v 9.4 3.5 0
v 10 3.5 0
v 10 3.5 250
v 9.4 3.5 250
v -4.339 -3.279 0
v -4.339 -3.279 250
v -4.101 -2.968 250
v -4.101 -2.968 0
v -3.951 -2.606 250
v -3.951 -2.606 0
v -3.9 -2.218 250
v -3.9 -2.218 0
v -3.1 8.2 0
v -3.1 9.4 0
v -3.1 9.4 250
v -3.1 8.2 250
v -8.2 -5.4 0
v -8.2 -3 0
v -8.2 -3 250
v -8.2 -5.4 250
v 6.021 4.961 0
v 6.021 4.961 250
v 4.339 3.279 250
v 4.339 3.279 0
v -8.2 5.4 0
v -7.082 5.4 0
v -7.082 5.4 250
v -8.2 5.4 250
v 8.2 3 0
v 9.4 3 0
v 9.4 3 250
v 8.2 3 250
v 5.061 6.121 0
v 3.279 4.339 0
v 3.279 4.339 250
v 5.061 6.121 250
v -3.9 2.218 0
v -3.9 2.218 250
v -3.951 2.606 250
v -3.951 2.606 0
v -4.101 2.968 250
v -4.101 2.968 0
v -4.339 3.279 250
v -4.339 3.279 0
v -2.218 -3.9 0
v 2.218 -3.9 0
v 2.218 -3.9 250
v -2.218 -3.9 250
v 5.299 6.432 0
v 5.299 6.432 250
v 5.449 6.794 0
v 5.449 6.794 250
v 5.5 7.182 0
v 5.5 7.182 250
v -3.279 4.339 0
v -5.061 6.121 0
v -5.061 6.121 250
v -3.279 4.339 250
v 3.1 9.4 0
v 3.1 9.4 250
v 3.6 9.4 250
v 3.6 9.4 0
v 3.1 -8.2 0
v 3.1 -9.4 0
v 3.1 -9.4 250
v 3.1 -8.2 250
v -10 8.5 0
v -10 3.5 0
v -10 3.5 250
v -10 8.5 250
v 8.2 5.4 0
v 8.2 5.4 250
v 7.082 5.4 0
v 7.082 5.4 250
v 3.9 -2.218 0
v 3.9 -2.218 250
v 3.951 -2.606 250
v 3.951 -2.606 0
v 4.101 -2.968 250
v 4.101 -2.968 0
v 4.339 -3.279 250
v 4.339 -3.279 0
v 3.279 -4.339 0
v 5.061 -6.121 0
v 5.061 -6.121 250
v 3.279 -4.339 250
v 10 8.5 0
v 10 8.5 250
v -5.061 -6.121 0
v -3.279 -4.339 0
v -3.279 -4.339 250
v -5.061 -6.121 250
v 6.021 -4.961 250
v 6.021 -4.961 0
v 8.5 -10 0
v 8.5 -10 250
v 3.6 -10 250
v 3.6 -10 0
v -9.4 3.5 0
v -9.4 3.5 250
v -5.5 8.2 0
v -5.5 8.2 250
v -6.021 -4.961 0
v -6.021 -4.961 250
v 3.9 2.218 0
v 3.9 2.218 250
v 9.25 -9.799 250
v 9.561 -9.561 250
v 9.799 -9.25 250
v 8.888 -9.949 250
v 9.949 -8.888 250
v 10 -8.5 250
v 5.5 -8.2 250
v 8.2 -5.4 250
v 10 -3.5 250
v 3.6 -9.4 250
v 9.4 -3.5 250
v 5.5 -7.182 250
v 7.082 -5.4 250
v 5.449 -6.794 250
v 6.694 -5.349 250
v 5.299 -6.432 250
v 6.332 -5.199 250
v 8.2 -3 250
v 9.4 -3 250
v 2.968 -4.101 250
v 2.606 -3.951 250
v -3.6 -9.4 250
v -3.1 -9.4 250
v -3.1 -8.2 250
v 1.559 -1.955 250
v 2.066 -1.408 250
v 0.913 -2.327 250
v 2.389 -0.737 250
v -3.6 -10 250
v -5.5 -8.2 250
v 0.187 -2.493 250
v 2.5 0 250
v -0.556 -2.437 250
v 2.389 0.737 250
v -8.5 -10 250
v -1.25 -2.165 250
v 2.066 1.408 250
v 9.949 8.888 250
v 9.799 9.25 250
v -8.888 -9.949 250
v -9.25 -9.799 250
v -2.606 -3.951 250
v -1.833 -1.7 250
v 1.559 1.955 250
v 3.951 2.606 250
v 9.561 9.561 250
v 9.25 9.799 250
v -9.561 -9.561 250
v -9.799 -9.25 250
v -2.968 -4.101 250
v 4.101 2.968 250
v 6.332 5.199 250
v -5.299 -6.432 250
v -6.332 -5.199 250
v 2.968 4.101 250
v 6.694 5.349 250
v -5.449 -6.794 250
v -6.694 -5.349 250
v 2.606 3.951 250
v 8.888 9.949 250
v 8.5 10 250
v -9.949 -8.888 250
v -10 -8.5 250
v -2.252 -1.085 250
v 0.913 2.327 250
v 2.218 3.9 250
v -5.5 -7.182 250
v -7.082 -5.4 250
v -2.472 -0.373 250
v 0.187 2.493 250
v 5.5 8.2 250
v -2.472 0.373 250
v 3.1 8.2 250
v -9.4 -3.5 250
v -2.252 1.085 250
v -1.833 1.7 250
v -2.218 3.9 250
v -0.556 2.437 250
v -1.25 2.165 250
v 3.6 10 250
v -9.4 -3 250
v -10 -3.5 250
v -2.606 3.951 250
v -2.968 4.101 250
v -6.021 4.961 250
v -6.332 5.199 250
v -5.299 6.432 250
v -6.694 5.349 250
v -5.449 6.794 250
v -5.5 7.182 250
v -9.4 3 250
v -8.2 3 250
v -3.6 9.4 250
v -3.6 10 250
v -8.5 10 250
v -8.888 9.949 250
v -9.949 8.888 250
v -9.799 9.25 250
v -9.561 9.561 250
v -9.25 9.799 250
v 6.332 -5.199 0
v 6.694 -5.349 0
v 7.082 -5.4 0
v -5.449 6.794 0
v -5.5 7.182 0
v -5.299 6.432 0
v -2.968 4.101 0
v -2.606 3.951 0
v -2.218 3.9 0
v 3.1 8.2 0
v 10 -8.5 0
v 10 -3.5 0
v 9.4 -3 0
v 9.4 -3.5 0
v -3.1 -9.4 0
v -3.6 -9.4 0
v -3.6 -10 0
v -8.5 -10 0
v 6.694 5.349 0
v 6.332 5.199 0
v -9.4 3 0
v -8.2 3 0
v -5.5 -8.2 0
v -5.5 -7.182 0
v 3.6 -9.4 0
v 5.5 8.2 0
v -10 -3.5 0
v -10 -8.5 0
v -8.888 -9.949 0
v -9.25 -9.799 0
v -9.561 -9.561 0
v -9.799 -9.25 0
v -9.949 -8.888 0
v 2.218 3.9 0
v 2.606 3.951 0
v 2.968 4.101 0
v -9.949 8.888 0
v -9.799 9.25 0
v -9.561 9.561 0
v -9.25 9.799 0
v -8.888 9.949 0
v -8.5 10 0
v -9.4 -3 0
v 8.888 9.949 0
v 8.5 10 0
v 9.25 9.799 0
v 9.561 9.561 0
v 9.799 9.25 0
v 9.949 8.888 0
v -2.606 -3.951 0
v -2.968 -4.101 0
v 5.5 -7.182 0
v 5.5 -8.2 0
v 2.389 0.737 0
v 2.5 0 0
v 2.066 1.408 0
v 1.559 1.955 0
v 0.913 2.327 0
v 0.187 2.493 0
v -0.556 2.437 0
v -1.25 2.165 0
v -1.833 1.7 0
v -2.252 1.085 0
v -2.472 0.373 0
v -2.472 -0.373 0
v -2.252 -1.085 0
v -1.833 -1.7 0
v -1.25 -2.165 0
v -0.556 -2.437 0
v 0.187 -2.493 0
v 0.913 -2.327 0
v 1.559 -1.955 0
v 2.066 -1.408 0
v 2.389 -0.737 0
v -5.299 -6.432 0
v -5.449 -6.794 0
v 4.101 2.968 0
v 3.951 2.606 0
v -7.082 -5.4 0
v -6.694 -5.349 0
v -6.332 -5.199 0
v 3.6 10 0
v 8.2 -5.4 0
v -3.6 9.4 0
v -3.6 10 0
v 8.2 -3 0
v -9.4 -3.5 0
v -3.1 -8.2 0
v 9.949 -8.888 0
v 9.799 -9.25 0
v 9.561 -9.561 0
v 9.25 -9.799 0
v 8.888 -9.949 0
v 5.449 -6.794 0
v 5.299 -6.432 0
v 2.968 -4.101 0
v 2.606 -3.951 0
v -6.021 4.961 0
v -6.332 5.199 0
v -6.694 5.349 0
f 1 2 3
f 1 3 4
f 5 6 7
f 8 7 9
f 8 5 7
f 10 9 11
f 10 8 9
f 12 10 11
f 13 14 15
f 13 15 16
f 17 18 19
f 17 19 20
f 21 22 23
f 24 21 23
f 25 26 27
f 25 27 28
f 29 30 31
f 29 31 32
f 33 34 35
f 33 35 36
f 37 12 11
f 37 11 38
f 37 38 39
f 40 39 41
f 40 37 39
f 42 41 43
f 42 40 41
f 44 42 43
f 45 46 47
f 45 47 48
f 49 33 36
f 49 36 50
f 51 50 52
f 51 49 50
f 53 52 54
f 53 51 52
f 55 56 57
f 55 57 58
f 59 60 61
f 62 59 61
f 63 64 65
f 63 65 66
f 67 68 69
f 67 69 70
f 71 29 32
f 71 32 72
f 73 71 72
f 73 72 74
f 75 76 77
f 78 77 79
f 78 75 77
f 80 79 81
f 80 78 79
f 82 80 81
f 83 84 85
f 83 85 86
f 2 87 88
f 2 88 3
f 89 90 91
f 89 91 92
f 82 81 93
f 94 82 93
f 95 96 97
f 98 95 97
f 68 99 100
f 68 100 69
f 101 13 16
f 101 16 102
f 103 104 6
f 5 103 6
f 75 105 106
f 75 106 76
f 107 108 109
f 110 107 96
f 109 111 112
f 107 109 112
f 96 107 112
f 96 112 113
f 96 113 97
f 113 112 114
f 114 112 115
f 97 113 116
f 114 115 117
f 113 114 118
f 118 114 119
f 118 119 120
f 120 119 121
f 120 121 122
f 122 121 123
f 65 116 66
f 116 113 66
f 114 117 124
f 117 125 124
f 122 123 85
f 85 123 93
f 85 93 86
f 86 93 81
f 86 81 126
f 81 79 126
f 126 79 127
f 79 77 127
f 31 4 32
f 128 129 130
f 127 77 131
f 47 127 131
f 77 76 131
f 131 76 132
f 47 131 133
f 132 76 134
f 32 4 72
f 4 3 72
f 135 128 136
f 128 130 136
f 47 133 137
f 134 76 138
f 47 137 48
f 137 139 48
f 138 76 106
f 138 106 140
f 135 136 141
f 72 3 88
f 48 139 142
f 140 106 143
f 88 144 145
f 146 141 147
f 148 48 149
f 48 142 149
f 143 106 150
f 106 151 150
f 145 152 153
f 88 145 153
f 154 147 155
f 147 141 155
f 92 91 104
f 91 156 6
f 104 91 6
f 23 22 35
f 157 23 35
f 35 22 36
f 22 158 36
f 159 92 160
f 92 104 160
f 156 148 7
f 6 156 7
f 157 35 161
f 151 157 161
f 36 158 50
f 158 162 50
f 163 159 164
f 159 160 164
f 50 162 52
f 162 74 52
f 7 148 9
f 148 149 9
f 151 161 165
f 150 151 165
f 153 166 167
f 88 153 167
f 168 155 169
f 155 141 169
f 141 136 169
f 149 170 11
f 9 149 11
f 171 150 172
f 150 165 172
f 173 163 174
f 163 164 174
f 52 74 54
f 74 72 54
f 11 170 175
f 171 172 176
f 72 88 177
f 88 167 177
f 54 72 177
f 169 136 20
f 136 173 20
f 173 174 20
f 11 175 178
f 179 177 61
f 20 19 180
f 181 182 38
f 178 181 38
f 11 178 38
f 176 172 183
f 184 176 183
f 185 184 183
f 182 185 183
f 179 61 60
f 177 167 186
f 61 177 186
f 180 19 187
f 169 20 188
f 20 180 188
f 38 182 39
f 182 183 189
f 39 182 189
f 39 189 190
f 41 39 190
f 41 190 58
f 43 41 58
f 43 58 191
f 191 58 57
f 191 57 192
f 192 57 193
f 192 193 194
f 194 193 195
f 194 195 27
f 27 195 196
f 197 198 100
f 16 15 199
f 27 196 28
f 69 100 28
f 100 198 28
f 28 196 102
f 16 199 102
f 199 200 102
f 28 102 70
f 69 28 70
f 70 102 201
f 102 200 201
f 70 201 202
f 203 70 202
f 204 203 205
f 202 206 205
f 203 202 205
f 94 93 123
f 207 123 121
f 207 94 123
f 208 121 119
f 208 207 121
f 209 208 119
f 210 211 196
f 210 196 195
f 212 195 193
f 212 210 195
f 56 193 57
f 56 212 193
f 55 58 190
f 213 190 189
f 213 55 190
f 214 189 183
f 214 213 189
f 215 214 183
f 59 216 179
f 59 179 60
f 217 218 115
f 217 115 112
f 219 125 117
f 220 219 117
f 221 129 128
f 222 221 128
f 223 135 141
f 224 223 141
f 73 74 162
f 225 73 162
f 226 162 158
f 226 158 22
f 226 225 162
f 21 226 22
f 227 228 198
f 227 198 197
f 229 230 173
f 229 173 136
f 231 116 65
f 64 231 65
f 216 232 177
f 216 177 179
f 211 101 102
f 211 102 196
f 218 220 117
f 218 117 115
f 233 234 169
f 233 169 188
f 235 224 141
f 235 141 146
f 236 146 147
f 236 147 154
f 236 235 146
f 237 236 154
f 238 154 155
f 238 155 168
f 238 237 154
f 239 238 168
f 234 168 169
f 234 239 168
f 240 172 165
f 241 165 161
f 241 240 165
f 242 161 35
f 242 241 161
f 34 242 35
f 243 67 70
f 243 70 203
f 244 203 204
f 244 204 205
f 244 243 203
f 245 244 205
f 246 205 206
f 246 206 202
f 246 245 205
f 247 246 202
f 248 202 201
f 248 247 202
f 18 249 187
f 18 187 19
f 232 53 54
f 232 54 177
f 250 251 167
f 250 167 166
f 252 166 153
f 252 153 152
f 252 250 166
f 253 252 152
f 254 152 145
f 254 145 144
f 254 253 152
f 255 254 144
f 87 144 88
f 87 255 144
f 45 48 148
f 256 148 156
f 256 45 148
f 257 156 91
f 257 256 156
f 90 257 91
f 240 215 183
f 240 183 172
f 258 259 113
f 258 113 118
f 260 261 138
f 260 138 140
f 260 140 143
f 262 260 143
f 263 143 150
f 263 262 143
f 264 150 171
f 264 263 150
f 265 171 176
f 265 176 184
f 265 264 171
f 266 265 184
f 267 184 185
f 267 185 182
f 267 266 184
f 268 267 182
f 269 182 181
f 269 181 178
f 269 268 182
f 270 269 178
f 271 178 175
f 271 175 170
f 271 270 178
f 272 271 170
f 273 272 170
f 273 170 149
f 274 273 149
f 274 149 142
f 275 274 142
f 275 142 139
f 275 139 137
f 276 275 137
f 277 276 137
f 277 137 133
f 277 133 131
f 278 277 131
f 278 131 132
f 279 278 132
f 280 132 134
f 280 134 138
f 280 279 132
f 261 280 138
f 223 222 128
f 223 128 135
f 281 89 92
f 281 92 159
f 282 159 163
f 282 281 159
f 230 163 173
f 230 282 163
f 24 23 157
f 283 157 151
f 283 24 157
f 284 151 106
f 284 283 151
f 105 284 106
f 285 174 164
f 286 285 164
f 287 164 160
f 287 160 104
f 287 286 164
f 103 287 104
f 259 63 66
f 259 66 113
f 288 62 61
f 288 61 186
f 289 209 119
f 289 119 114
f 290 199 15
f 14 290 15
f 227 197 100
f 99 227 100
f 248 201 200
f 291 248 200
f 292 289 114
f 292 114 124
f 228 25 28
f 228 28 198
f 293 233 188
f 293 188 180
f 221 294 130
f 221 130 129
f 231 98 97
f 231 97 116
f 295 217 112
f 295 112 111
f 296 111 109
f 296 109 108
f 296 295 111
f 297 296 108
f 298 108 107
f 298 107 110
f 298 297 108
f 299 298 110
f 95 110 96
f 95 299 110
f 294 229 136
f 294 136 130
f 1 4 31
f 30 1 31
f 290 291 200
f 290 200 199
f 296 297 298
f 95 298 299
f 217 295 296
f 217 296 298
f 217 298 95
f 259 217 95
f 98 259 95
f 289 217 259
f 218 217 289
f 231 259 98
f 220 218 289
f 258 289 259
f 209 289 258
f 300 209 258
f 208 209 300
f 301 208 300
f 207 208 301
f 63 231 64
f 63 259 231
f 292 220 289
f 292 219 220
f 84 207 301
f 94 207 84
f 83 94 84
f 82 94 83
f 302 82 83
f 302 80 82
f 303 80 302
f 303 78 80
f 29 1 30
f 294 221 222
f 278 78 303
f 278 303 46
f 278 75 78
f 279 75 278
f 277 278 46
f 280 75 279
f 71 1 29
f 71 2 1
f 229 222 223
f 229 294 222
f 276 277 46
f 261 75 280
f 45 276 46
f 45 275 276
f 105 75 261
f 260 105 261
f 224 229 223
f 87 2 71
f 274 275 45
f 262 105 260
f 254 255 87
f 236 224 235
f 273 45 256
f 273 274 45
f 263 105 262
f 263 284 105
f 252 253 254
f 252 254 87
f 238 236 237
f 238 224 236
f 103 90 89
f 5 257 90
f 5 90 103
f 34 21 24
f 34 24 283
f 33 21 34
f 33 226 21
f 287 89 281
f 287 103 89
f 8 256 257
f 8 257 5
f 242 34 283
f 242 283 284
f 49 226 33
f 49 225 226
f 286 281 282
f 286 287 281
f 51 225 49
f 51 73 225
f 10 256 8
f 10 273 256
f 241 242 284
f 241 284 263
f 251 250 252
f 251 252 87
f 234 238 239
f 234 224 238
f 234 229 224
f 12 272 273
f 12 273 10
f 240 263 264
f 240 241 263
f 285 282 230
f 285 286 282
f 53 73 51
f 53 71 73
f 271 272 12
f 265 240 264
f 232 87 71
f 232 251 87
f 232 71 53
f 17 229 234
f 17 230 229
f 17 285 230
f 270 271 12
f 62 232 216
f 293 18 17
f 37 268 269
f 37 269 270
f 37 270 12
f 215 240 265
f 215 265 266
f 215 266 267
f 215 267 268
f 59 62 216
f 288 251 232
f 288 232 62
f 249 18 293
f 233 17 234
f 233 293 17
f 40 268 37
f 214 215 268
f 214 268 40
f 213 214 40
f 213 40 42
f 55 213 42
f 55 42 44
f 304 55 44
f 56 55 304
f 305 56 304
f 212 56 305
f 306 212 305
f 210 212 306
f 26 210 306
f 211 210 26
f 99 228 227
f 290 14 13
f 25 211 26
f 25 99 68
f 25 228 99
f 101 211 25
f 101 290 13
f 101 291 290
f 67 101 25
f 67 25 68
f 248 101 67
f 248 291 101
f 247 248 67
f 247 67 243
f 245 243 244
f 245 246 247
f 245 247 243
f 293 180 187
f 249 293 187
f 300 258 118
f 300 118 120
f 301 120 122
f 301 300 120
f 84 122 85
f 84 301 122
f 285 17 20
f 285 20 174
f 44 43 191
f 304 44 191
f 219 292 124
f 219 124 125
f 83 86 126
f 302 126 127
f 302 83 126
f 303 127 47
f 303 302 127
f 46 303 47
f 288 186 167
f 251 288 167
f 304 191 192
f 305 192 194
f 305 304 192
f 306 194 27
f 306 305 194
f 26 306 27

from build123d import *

# Parameters (mm, degrees)
SKETCH1_R           = 2.5
BOSS_EXTRUDE1_DEPTH = 250


with BuildPart() as part:
    # Sketch1 → Boss-Extrude1 (new body)
    with BuildSketch(Plane.XY):
        with BuildLine():
            Line((-3.6, -10), (-8.5, -10))
            ThreePointArc((-8.5, -10), (-9.560660172, -9.560660172), (-10, -8.5))
            Line((-10, -8.5), (-10, -3.5))
            Line((-10, -3.5), (-9.4, -3.5))
            Line((-9.4, -3.5), (-9.4, -3))
            Line((-9.4, -3), (-8.2, -3))
            Line((-8.2, -3), (-8.2, -5.4))
            Line((-8.2, -5.4), (-7.081980515, -5.4))
            ThreePointArc((-7.081980515, -5.4), (-6.507955367, -5.285819299), (-6.021320344, -4.960660172))
            Line((-6.021320344, -4.960660172), (-4.339339828, -3.278679656))
            ThreePointArc((-4.339339828, -3.278679656), (-4.014180701, -2.792044633), (-3.9, -2.218019485))
            Line((-3.9, -2.218019485), (-3.9, 2.218019485))
            ThreePointArc((-3.9, 2.218019485), (-4.014180701, 2.792044633), (-4.339339828, 3.278679656))
            Line((-4.339339828, 3.278679656), (-6.021320344, 4.960660172))
            ThreePointArc((-6.021320344, 4.960660172), (-6.507955367, 5.285819299), (-7.081980515, 5.4))
            Line((-7.081980515, 5.4), (-8.2, 5.4))
            Line((-8.2, 5.4), (-8.2, 3))
            Line((-8.2, 3), (-9.4, 3))
            Line((-9.4, 3), (-9.4, 3.5))
            Line((-9.4, 3.5), (-10, 3.5))
            Line((-10, 3.5), (-10, 8.5))
            ThreePointArc((-10, 8.5), (-9.560660172, 9.560660172), (-8.5, 10))
            Line((-8.5, 10), (-3.6, 10))
            Line((-3.6, 10), (-3.6, 9.4))
            Line((-3.6, 9.4), (-3.1, 9.4))
            Line((-3.1, 9.4), (-3.1, 8.2))
            Line((-3.1, 8.2), (-5.5, 8.2))
            Line((-5.5, 8.2), (-5.5, 7.181980515))
            ThreePointArc((-5.5, 7.181980515), (-5.385819299, 6.607955367), (-5.060660172, 6.121320344))
            Line((-5.060660172, 6.121320344), (-3.278679656, 4.339339828))
            ThreePointArc((-3.278679656, 4.339339828), (-2.792044633, 4.014180701), (-2.218019485, 3.9))
            Line((-2.218019485, 3.9), (2.218019485, 3.9))
            ThreePointArc((2.218019485, 3.9), (2.792044633, 4.014180701), (3.278679656, 4.339339828))
            Line((3.278679656, 4.339339828), (5.060660172, 6.121320344))
            ThreePointArc((5.060660172, 6.121320344), (5.385819299, 6.607955367), (5.5, 7.181980515))
            Line((5.5, 7.181980515), (5.5, 8.2))
            Line((5.5, 8.2), (3.1, 8.2))
            Line((3.1, 8.2), (3.1, 9.4))
            Line((3.1, 9.4), (3.6, 9.4))
            Line((3.6, 9.4), (3.6, 10))
            Line((3.6, 10), (8.5, 10))
            ThreePointArc((8.5, 10), (9.560660172, 9.560660172), (10, 8.5))
            Line((10, 8.5), (10, 3.5))
            Line((10, 3.5), (9.4, 3.5))
            Line((9.4, 3.5), (9.4, 3))
            Line((9.4, 3), (8.2, 3))
            Line((8.2, 3), (8.2, 5.4))
            Line((8.2, 5.4), (7.081980515, 5.4))
            ThreePointArc((7.081980515, 5.4), (6.507955367, 5.285819299), (6.021320344, 4.960660172))
            Line((6.021320344, 4.960660172), (4.339339828, 3.278679656))
            ThreePointArc((4.339339828, 3.278679656), (4.014180701, 2.792044633), (3.9, 2.218019485))
            Line((3.9, 2.218019485), (3.9, -2.218019485))
            ThreePointArc((3.9, -2.218019485), (4.014180701, -2.792044633), (4.339339828, -3.278679656))
            Line((4.339339828, -3.278679656), (6.021320344, -4.960660172))
            ThreePointArc((6.021320344, -4.960660172), (6.507955367, -5.285819299), (7.081980515, -5.4))
            Line((7.081980515, -5.4), (8.2, -5.4))
            Line((8.2, -5.4), (8.2, -3))
            Line((8.2, -3), (9.4, -3))
            Line((9.4, -3), (9.4, -3.5))
            Line((9.4, -3.5), (10, -3.5))
            Line((10, -3.5), (10, -8.5))
            ThreePointArc((10, -8.5), (9.560660172, -9.560660172), (8.5, -10))
            Line((8.5, -10), (3.6, -10))
            Line((3.6, -10), (3.6, -9.4))
            Line((3.6, -9.4), (3.1, -9.4))
            Line((3.1, -9.4), (3.1, -8.2))
            Line((3.1, -8.2), (5.5, -8.2))
            Line((5.5, -8.2), (5.5, -7.181980515))
            ThreePointArc((5.5, -7.181980515), (5.385819299, -6.607955367), (5.060660172, -6.121320344))
            Line((5.060660172, -6.121320344), (3.278679656, -4.339339828))
            ThreePointArc((3.278679656, -4.339339828), (2.792044633, -4.014180701), (2.218019485, -3.9))
            Line((2.218019485, -3.9), (-2.218019485, -3.9))
            ThreePointArc((-2.218019485, -3.9), (-2.792044633, -4.014180701), (-3.278679656, -4.339339828))
            Line((-3.278679656, -4.339339828), (-5.060660172, -6.121320344))
            ThreePointArc((-5.060660172, -6.121320344), (-5.385819299, -6.607955367), (-5.5, -7.181980515))
            Line((-5.5, -7.181980515), (-5.5, -8.2))
            Line((-5.5, -8.2), (-3.1, -8.2))
            Line((-3.1, -8.2), (-3.1, -9.4))
            Line((-3.1, -9.4), (-3.6, -9.4))
            Line((-3.6, -9.4), (-3.6, -10))
        make_face()
        Circle(SKETCH1_R, mode=Mode.SUBTRACT)
    extrude(amount=BOSS_EXTRUDE1_DEPTH)


solid = part.part
